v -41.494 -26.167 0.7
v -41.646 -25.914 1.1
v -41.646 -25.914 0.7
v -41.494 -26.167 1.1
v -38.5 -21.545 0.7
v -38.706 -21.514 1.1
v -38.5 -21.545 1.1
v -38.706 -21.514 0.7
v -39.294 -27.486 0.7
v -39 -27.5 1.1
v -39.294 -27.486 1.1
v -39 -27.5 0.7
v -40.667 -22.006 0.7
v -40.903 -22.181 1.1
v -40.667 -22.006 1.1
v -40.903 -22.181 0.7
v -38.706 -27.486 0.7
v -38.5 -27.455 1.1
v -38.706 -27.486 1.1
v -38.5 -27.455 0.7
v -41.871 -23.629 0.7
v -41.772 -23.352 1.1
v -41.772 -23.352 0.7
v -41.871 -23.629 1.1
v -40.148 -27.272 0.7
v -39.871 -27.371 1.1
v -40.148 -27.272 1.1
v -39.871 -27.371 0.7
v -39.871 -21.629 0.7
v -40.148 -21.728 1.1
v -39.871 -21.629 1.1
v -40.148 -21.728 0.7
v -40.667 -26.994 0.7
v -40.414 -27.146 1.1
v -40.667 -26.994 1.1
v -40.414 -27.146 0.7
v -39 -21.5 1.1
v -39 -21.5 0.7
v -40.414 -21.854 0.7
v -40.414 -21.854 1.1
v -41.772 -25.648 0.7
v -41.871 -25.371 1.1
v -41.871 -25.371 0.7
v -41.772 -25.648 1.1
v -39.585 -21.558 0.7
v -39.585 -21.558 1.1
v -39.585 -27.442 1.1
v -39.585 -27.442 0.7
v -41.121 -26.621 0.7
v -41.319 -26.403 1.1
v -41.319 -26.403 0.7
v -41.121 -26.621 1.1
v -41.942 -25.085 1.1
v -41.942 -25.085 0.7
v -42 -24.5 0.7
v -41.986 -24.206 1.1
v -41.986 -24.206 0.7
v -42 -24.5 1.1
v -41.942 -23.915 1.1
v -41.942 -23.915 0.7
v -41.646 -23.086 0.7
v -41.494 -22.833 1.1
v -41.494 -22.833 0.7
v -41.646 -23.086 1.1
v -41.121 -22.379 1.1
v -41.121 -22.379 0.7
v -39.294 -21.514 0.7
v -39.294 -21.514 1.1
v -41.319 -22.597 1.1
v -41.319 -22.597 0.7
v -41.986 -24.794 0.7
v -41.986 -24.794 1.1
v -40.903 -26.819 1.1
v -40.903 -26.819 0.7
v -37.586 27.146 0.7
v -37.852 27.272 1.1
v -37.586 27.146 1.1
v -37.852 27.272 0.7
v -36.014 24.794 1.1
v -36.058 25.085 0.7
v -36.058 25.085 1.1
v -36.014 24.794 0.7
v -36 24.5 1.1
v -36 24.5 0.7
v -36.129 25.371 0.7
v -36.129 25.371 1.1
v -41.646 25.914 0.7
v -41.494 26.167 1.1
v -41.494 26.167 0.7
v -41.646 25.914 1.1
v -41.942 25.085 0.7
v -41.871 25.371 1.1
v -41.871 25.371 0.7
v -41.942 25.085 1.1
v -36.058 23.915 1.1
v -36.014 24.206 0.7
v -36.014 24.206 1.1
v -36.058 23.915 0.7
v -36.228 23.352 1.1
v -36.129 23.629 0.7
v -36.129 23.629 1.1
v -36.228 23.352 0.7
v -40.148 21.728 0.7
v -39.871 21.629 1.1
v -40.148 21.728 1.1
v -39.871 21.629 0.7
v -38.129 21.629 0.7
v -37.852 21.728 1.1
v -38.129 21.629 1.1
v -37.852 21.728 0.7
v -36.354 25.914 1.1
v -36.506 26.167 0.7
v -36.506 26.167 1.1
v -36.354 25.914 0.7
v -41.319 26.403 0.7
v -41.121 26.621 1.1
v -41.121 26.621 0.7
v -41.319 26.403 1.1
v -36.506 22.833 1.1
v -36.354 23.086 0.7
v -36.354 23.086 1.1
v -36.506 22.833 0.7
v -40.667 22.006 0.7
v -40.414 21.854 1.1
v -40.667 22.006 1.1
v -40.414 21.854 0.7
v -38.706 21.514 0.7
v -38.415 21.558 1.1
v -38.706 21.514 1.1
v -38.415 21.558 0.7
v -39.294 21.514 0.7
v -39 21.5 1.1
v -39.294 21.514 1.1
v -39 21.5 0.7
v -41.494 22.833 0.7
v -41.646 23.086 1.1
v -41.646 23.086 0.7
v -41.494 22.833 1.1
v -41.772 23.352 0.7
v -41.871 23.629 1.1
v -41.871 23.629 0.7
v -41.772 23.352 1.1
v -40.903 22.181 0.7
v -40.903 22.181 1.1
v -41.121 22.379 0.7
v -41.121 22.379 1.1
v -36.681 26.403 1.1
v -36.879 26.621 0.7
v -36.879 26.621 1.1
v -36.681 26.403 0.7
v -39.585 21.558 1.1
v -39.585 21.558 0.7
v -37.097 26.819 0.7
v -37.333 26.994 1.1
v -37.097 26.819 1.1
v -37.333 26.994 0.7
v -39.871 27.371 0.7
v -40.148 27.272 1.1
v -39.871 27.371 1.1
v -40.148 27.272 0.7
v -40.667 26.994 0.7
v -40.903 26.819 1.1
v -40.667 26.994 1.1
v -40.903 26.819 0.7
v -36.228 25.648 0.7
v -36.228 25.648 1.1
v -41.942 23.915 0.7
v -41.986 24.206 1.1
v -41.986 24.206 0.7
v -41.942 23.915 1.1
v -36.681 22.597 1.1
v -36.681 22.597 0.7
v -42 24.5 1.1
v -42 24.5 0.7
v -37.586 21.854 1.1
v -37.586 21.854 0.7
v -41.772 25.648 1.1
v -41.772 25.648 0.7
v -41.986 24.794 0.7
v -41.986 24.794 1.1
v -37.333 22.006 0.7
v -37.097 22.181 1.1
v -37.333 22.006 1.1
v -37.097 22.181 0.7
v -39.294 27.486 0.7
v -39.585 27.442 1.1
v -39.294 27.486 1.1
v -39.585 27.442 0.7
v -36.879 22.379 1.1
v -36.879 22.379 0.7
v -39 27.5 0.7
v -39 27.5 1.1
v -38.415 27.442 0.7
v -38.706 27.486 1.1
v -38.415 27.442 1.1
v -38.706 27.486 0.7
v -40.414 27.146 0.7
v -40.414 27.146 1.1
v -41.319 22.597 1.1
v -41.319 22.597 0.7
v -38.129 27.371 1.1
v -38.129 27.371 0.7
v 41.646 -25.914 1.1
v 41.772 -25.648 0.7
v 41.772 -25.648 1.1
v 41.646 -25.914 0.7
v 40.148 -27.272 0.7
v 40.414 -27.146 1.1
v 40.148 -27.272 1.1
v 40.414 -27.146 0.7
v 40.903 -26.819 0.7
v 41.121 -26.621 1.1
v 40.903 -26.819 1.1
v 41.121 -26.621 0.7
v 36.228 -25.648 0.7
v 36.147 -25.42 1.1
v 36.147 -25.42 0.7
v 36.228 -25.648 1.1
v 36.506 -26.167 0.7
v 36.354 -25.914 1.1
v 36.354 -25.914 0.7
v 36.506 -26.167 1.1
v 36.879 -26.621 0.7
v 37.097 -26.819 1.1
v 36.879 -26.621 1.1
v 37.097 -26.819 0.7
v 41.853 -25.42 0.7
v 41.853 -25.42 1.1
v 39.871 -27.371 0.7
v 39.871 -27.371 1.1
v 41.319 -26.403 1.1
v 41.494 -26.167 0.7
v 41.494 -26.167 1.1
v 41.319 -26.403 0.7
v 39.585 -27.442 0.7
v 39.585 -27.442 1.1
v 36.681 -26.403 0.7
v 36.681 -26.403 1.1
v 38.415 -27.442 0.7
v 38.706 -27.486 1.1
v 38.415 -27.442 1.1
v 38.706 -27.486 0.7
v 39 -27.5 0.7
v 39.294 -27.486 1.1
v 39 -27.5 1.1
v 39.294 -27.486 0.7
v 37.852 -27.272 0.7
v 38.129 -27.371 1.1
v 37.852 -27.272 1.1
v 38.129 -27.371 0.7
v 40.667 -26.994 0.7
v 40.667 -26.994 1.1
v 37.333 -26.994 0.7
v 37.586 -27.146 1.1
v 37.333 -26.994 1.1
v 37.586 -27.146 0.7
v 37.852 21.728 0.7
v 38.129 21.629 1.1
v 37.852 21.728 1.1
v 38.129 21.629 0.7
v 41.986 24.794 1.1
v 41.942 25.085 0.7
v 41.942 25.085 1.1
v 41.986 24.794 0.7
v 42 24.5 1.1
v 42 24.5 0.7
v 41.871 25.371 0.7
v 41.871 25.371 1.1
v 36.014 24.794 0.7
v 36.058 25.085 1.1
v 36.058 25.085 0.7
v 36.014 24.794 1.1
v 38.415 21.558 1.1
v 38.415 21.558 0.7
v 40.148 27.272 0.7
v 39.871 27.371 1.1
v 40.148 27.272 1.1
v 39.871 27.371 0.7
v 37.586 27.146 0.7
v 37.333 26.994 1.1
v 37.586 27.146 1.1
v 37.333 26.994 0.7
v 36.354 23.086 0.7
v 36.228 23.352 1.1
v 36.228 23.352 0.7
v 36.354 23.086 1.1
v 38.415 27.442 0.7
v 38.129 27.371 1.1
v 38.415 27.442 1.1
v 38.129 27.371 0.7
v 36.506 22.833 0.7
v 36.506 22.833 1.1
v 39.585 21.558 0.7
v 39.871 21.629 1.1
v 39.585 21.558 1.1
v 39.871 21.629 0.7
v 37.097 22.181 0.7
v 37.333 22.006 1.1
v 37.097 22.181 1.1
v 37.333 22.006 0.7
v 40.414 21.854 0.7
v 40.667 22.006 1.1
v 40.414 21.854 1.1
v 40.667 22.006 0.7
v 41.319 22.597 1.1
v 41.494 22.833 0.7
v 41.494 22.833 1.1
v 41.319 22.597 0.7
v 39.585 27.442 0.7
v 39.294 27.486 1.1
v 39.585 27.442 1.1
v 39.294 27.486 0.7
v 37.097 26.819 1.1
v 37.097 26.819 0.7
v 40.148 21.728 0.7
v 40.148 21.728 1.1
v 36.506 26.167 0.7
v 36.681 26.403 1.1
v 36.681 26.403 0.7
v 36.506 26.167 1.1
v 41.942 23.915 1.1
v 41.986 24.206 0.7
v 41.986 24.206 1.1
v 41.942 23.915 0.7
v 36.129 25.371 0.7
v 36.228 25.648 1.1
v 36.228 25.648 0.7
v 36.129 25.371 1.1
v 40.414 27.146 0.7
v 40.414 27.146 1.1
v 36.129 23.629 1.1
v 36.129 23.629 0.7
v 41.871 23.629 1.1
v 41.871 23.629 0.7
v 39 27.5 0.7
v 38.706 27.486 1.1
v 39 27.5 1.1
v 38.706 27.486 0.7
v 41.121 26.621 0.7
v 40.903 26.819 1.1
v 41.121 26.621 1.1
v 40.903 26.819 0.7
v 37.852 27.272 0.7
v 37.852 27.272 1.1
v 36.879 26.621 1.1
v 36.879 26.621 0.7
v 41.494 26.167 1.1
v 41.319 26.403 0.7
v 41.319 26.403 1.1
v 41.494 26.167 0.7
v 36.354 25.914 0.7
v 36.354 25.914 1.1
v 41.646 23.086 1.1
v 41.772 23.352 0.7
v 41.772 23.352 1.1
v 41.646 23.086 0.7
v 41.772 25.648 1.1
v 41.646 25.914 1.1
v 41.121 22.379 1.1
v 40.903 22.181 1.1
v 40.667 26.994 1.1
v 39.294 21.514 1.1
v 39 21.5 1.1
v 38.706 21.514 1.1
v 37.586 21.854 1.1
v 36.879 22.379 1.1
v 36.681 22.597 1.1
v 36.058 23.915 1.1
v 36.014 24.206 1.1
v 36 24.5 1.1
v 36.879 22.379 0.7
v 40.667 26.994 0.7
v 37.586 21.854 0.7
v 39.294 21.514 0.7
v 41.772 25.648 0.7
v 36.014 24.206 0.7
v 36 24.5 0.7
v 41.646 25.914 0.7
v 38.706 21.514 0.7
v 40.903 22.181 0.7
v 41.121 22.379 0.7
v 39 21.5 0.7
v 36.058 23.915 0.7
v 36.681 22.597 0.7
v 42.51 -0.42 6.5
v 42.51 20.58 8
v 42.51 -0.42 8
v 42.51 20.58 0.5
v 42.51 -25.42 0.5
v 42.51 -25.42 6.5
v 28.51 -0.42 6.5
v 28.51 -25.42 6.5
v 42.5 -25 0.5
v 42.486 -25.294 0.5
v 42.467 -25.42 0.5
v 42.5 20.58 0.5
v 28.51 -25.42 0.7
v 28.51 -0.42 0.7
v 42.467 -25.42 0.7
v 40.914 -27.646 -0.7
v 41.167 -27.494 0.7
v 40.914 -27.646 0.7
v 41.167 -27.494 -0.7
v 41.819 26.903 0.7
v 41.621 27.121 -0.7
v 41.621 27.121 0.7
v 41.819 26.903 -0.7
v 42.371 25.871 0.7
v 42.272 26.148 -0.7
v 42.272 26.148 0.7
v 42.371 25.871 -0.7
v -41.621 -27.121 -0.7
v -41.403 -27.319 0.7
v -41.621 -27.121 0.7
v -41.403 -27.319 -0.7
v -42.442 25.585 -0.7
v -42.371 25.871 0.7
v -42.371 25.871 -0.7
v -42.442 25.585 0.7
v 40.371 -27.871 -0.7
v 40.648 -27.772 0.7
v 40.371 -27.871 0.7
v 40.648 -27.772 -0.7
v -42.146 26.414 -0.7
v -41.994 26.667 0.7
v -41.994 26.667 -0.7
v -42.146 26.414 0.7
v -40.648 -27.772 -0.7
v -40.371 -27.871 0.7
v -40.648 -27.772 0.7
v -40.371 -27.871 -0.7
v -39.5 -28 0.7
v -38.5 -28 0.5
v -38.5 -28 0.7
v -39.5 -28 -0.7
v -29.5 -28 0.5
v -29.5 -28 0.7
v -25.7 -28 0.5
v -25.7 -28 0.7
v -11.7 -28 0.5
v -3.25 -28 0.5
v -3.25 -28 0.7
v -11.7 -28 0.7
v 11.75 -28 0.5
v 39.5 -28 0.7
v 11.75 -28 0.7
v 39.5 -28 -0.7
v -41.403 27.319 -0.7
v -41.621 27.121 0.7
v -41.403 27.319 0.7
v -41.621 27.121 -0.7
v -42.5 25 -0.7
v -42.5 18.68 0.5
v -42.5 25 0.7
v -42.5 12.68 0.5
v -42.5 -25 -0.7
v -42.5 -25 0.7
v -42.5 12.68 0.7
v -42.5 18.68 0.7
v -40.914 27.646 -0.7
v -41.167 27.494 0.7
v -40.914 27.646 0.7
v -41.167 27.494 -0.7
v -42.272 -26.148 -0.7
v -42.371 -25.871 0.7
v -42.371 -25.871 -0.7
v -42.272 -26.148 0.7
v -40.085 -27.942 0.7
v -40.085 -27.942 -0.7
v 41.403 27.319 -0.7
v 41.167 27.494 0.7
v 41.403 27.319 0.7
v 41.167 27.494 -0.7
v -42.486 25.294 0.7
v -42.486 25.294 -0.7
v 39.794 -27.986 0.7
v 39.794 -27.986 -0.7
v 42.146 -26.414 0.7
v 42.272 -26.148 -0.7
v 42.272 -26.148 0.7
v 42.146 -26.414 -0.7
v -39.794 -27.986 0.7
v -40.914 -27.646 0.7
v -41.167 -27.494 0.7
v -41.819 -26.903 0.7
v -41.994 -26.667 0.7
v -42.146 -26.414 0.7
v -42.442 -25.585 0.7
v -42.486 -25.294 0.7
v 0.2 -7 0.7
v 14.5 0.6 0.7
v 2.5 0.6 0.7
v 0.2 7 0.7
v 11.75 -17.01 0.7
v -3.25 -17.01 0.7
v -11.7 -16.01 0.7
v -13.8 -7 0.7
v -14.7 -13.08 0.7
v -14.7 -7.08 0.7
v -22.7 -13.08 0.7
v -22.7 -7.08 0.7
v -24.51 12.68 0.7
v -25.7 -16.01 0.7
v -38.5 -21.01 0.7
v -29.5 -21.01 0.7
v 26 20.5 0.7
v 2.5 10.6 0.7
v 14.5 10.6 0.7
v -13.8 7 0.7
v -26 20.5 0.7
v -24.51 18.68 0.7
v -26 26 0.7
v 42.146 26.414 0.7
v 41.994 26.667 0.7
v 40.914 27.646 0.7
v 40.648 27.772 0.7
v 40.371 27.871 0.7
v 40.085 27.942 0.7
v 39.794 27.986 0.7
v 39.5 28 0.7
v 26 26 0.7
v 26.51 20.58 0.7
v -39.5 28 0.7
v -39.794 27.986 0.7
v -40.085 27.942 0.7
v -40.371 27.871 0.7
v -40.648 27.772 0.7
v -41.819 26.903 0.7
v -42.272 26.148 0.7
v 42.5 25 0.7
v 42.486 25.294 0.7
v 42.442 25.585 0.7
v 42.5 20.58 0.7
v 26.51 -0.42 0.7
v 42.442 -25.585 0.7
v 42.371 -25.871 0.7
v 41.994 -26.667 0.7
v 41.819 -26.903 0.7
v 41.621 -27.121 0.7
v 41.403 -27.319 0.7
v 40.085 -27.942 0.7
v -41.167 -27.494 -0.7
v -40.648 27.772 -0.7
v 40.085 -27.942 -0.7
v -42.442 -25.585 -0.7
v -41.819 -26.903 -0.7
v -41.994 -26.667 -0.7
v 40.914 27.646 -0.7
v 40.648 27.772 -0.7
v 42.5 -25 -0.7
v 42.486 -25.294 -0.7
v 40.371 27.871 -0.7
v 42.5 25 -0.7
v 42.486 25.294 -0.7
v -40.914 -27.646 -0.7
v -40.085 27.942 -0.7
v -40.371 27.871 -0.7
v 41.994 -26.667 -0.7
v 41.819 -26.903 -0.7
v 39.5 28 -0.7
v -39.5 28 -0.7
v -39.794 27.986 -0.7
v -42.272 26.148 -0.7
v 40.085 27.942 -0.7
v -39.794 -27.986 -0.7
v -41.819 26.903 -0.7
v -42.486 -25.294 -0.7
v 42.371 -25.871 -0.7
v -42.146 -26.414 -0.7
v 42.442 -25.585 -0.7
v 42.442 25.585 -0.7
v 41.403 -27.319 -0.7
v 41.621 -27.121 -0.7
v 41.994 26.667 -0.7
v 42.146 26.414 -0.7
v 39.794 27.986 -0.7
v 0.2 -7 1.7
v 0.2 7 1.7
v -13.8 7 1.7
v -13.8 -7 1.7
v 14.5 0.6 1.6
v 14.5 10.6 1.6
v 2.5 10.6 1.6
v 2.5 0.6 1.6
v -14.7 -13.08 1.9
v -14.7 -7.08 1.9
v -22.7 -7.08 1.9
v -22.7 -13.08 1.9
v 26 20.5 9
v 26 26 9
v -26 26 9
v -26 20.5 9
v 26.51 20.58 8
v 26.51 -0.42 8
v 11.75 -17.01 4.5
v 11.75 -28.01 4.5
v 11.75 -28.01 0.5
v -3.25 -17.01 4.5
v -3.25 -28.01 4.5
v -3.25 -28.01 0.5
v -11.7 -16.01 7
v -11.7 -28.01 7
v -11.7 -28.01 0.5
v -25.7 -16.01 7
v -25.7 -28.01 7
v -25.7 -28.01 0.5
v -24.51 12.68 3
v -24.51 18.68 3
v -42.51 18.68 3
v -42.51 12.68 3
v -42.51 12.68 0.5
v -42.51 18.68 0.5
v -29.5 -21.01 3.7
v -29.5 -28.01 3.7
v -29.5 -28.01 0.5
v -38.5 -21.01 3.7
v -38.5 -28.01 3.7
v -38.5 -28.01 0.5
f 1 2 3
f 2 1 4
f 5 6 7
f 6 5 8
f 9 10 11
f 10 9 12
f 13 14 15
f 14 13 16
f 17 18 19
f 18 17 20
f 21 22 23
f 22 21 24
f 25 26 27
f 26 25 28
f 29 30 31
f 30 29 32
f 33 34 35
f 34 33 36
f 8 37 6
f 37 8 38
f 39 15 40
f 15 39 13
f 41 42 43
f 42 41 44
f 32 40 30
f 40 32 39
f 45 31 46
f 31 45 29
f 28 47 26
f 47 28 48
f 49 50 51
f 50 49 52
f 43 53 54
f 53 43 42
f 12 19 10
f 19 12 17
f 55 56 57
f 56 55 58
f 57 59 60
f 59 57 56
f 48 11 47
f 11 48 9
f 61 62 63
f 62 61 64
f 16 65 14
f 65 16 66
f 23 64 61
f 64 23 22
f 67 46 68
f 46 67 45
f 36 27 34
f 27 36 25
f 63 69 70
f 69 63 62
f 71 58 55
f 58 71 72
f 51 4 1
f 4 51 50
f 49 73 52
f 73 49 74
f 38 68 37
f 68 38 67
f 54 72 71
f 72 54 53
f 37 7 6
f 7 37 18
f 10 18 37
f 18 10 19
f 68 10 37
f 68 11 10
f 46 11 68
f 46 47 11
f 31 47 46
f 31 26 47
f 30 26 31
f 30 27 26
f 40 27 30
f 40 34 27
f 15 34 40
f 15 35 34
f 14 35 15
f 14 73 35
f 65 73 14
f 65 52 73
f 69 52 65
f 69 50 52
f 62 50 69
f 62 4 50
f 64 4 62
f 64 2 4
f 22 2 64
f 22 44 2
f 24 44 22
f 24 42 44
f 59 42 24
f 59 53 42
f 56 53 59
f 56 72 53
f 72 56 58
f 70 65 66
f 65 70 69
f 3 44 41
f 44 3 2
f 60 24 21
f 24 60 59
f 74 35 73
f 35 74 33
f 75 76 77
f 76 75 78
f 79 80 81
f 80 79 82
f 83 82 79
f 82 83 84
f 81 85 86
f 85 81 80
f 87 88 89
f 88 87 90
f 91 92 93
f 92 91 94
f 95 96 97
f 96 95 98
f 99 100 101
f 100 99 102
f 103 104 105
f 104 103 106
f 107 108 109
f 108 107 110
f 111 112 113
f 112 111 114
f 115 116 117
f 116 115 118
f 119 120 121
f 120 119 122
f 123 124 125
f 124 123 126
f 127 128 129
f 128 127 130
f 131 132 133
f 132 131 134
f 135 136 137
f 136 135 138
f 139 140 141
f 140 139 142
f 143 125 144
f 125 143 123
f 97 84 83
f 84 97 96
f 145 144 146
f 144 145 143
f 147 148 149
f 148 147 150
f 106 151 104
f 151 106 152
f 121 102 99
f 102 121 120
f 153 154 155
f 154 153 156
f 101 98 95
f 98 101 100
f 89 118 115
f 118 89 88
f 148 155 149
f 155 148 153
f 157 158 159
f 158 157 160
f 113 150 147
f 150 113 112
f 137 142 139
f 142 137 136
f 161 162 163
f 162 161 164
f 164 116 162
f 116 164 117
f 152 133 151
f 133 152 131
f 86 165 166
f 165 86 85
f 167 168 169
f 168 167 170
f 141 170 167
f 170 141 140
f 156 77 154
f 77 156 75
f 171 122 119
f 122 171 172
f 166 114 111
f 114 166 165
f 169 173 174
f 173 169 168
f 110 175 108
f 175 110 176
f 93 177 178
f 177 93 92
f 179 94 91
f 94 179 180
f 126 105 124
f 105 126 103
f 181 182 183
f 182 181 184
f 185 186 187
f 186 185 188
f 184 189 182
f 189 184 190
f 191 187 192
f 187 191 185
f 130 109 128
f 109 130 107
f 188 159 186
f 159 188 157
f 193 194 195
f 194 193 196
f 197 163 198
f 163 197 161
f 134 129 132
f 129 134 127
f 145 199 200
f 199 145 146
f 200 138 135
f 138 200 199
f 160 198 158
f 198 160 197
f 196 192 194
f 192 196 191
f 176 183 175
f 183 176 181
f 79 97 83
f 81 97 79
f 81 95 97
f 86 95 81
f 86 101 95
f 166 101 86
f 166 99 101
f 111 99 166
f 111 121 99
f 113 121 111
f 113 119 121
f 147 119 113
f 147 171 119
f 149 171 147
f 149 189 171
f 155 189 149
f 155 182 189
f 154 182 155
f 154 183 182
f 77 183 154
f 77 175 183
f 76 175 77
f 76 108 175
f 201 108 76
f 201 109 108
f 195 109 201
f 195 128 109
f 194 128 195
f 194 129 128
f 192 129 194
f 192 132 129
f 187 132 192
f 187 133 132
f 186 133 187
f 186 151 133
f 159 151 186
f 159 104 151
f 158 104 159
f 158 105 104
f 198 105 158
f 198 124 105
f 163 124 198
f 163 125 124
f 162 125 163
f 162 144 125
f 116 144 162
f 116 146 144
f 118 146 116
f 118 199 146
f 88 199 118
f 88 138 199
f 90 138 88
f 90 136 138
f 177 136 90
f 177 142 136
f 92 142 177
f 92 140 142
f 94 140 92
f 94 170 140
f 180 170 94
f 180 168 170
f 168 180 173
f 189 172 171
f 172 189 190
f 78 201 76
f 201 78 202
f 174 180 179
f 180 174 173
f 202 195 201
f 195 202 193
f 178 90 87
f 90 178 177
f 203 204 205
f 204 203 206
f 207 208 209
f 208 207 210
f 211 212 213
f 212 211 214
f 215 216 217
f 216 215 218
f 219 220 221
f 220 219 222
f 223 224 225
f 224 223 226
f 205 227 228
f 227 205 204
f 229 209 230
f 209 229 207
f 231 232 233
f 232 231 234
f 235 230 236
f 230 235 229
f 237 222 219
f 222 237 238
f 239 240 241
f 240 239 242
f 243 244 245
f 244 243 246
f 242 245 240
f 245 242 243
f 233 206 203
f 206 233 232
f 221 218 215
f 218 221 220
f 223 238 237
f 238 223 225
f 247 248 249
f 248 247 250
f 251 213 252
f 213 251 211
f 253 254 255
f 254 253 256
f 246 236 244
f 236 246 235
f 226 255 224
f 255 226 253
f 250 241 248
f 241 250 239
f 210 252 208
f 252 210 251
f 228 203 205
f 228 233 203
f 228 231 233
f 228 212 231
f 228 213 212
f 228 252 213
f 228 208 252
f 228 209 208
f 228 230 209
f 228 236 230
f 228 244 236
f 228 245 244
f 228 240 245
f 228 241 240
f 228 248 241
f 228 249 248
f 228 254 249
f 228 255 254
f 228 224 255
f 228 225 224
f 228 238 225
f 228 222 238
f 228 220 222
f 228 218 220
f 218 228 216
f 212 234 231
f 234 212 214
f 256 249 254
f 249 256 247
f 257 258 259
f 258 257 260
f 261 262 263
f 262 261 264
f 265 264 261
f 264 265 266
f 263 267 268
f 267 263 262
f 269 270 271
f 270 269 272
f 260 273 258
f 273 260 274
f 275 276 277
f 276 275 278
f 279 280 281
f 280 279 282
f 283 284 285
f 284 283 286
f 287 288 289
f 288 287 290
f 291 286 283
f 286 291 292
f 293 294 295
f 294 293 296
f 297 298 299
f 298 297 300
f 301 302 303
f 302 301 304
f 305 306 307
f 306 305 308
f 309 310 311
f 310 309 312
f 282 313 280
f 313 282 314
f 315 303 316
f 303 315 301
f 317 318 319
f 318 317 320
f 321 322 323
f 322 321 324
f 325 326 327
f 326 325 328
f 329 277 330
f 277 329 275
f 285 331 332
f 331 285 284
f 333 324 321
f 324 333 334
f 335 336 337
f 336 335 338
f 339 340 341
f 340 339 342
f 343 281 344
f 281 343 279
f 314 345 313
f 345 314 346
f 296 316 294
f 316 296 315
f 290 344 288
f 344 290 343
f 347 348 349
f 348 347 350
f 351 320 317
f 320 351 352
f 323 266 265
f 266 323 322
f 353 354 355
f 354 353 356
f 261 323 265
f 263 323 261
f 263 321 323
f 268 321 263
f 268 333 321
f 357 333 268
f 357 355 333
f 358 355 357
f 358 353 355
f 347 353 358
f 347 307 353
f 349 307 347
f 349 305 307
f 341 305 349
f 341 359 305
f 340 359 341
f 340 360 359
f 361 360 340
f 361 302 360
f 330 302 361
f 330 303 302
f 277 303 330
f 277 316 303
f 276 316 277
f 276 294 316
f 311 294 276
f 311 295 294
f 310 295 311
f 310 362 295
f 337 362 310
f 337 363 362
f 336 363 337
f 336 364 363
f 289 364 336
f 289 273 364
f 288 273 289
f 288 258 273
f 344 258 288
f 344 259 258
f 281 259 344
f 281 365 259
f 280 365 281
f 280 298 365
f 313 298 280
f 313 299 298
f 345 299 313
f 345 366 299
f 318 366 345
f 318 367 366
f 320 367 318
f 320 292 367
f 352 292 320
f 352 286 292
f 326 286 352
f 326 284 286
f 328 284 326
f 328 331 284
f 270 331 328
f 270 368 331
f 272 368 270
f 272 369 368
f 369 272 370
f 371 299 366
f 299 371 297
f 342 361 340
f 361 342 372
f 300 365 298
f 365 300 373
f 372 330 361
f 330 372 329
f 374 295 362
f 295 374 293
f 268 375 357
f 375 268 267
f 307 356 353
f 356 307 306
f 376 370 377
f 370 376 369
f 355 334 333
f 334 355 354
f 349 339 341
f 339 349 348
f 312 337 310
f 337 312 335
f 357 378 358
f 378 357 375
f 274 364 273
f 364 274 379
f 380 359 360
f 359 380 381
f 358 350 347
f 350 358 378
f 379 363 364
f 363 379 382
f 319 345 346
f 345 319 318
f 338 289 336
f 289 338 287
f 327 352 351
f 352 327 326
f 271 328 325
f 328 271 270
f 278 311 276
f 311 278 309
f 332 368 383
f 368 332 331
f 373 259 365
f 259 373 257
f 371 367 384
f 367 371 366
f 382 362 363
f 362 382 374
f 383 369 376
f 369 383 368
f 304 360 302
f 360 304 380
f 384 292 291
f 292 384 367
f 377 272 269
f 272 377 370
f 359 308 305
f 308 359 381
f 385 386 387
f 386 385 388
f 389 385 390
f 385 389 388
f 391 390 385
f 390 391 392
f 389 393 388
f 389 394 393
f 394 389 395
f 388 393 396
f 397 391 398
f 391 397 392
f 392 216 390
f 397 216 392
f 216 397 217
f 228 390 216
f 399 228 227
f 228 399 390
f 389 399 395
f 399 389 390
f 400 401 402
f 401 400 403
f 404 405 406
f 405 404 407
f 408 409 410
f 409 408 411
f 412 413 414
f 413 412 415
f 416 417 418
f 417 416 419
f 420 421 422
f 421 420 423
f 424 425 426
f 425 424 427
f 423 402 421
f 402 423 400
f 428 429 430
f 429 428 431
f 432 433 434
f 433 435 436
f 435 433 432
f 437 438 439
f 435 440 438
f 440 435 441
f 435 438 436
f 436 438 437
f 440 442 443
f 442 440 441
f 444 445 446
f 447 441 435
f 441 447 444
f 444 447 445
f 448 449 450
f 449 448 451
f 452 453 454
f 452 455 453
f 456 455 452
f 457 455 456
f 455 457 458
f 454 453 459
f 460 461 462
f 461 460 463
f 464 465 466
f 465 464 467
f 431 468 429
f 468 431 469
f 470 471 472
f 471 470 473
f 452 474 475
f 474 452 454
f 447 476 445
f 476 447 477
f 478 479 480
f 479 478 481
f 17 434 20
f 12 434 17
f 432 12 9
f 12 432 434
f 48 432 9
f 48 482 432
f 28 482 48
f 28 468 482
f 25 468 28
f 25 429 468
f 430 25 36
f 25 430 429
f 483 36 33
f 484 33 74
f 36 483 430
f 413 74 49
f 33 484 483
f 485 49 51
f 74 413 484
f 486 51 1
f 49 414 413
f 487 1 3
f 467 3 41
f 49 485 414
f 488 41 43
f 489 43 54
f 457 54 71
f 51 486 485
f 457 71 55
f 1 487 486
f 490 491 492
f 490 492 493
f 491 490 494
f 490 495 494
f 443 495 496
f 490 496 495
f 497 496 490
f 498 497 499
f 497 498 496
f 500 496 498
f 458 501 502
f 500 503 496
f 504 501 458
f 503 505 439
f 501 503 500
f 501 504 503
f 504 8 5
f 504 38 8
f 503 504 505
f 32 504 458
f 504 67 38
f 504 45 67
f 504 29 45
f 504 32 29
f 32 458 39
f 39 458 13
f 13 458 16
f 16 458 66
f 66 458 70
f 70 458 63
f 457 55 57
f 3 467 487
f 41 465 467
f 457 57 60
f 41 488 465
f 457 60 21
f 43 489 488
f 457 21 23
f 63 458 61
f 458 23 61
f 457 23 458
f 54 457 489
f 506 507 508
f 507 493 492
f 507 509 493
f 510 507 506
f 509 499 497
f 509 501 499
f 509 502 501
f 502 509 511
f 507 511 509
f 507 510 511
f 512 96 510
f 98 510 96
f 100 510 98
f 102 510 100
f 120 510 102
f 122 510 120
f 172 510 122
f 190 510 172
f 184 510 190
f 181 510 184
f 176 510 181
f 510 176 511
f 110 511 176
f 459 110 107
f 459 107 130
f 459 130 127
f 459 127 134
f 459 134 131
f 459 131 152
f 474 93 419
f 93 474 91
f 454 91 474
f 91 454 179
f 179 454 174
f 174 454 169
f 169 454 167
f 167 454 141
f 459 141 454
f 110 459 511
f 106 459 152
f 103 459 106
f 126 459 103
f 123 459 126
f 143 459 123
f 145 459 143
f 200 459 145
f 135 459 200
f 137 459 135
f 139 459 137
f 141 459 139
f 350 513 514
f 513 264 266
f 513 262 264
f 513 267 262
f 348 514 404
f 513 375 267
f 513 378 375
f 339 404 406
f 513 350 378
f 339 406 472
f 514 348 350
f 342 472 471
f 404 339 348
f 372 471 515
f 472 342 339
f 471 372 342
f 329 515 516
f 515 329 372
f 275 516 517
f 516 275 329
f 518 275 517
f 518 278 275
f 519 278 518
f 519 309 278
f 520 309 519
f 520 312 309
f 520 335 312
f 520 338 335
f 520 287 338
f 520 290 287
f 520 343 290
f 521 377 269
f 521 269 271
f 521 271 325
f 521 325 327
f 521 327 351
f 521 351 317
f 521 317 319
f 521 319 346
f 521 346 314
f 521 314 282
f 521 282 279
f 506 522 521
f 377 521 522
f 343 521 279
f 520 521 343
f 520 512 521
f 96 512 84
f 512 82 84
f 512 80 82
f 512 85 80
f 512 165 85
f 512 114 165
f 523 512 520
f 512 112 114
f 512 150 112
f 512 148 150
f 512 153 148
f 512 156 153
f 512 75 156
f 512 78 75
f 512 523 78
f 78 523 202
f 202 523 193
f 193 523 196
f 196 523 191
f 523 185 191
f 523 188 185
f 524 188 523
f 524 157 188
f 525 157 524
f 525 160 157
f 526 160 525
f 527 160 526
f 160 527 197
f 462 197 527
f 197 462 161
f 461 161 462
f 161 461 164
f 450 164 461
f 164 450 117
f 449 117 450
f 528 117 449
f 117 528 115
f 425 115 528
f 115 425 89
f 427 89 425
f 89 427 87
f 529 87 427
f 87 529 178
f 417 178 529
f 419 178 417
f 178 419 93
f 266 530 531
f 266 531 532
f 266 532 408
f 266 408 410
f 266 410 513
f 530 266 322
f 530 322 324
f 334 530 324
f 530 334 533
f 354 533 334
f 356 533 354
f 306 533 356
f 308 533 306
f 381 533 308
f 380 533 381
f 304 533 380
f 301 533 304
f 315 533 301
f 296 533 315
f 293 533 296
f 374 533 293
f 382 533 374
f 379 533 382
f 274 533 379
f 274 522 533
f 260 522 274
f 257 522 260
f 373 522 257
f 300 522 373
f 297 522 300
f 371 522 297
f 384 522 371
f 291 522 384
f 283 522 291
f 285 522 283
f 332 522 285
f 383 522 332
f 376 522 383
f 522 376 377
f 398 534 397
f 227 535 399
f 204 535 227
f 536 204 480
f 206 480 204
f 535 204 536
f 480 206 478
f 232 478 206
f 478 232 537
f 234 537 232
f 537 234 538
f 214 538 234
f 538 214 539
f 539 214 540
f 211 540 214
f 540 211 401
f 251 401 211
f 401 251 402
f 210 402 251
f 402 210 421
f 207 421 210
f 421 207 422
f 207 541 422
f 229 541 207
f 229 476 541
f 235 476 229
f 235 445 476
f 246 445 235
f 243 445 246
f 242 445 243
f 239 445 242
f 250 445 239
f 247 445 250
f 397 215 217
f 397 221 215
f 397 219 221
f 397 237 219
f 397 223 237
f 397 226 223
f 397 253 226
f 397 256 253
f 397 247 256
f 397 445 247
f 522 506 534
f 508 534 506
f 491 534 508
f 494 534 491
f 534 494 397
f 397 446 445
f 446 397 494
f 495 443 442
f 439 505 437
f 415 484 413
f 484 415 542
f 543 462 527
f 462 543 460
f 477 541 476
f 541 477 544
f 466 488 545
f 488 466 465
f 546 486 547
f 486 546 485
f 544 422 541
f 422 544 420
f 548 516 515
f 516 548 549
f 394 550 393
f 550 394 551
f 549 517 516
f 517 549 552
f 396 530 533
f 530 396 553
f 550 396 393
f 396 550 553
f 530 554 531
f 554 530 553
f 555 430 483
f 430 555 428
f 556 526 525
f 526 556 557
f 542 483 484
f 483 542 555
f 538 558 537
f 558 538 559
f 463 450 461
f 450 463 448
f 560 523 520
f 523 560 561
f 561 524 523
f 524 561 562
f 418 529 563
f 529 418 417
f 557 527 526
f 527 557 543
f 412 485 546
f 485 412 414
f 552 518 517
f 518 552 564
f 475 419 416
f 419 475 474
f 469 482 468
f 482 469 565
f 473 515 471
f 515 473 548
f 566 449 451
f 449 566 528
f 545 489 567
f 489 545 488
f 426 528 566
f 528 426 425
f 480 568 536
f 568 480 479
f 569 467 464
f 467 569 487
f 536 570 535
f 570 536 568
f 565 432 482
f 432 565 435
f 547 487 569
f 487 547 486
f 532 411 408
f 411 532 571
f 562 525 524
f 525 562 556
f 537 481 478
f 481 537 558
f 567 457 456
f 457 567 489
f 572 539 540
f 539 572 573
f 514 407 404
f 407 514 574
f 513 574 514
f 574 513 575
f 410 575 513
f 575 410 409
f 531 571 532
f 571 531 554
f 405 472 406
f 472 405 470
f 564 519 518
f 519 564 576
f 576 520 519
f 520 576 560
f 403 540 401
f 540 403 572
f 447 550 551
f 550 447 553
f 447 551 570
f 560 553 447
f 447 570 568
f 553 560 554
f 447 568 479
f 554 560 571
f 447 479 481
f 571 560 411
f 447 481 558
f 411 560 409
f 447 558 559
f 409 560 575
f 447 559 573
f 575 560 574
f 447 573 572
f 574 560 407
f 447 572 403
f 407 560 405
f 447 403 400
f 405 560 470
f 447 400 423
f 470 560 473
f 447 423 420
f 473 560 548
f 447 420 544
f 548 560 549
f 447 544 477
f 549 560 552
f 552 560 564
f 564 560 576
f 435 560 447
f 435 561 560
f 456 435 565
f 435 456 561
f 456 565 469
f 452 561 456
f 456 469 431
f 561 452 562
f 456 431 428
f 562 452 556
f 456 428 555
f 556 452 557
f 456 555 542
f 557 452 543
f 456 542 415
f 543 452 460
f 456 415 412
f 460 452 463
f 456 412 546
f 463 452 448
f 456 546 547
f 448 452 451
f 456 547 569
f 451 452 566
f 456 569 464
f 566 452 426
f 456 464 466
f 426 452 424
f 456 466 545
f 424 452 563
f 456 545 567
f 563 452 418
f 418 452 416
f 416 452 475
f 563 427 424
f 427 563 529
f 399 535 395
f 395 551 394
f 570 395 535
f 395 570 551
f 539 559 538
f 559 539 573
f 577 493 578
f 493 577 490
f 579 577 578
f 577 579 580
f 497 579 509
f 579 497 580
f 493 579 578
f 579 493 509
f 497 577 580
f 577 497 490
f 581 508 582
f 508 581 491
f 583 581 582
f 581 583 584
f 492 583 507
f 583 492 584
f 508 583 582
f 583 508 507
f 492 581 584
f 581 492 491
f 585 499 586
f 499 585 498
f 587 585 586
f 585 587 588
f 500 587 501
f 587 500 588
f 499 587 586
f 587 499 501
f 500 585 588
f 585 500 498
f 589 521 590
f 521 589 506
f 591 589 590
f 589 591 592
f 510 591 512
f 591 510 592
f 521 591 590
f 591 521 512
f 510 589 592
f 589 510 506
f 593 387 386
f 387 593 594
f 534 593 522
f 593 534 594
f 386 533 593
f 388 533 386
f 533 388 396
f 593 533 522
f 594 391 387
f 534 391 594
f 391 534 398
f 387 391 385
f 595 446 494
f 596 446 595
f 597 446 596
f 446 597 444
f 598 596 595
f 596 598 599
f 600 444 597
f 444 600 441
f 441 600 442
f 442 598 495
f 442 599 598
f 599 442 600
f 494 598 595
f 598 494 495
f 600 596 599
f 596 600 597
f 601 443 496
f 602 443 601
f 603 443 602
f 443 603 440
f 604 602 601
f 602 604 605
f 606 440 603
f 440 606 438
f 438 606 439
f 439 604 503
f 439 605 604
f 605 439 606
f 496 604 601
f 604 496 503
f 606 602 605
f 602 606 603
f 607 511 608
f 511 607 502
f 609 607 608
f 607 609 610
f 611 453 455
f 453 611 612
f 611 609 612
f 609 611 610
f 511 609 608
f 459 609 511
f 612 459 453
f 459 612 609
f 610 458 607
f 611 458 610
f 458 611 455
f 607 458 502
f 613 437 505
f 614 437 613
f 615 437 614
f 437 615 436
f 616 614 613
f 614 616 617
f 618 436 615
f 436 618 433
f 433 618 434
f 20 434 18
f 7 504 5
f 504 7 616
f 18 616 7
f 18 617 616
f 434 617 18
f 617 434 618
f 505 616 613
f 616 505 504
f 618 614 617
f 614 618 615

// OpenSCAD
$fn = 64;

// Target PCB dimensions (mm)
pcb_length = 85.0;
pcb_width  = 56.0;
pcb_thickness = 1.4;

// Detail parameters (kept small and connected)
corner_r = 3.0;          // rounded corner radius
overlap = 0.2;           // small overlap to guarantee connectivity
mask = 0.01;             // tiny offset to avoid coplanar artifacts

// Component heights (above PCB)
chip_h = 1.2;
usb_h  = 6.0;
eth_h  = 7.5;
hdmi_h = 4.0;
jack_h = 6.5;
gpio_h = 8.5;

// Helper: rounded rectangle prism centered at origin
module rounded_rect_prism(L, W, H, R) {
    // Ensure R is valid
    r = min(R, min(L, W)/2 - 0.01);
    linear_extrude(height=H, center=true)
        offset(r=r)
            square([L - 2*r, W - 2*r], center=true);
}

// Helper: place a part so it sits on top of PCB (and overlaps slightly into it)
module on_top(part_h) {
    translate([0, 0, pcb_thickness/2 + part_h/2 - overlap])
        children();
}

// Main model: one connected solid (union of PCB + components)
module single_board_computer() {
    union() {
        // PCB body
        color([0.0, 0.4, 0.2])
            rounded_rect_prism(pcb_length, pcb_width, pcb_thickness, corner_r);

        // Mounting hole pads (solid bosses; no holes to keep one solid)
        pad_d = 6.0;
        pad_h = 0.6;
        hole_inset_x = 3.5;
        hole_inset_y = 3.5;

        for (sx = [-1, 1], sy = [-1, 1]) {
            translate([
                sx*(pcb_length/2 - hole_inset_x),
                sy*(pcb_width/2  - hole_inset_y),
                pcb_thickness/2 + pad_h/2 - overlap
            ])
            color([0.85, 0.75, 0.2])
                cylinder(d=pad_d, h=pad_h, center=true);
        }

        // Main SoC chip (center-ish)
        chip1_l = 14; chip1_w = 14;
        translate([ -pcb_length*0.08, 0, 0 ])
            on_top(chip_h)
                color([0.15, 0.15, 0.15])
                    cube([chip1_l, chip1_w, chip_h], center=true);

        // RAM chip
        chip2_l = 12; chip2_w = 10; chip2_h = 1.1;
        translate([ pcb_length*0.10, pcb_width*0.10, 0 ])
            on_top(chip2_h)
                color([0.18, 0.18, 0.18])
                    cube([chip2_l, chip2_w, chip2_h], center=true);

        // Small power/regulator block
        reg_l = 8; reg_w = 6; reg_h = 1.4;
        translate([ -pcb_length*0.22, -pcb_width*0.18, 0 ])
            on_top(reg_h)
                color([0.12, 0.12, 0.12])
                    cube([reg_l, reg_w, reg_h], center=true);

        // GPIO header (pin block) along top edge (y+)
        gpio_l = 52; gpio_w = 5.5;
        translate([ 0, pcb_width/2 - gpio_w/2 - 2.0, 0 ])
            on_top(gpio_h)
                color([0.05, 0.05, 0.05])
                    cube([gpio_l, gpio_w, gpio_h], center=true);

        // Side connectors along right edge (x+): USB + Ethernet blocks
        // Ethernet (larger)
        eth_l = 16; eth_w = 21;
        translate([ pcb_length/2 - eth_l/2 + mask, pcb_width*0.18, 0 ])
            on_top(eth_h)
                color([0.75, 0.75, 0.75])
                    cube([eth_l, eth_w, eth_h], center=true);

        // Two USB ports (stacked-ish)
        usb_l = 14; usb_w = 15;
        for (yy = [ -pcb_width*0.10, -pcb_width*0.32 ]) {
            translate([ pcb_length/2 - usb_l/2 + mask, yy, 0 ])
                on_top(usb_h)
                    color([0.78, 0.78, 0.78])
                        cube([usb_l, usb_w, usb_h], center=true);
        }

        // Bottom edge connectors (y-): HDMI + audio jack
        // HDMI
        hdmi_l = 15; hdmi_w = 11;
        translate([ pcb_length*0.05, -pcb_width/2 + hdmi_w/2 - mask, 0 ])
            on_top(hdmi_h)
                color([0.65, 0.65, 0.65])
                    cube([hdmi_l, hdmi_w, hdmi_h], center=true);

        // Audio jack
        jack_l = 14; jack_w = 12;
        translate([ -pcb_length*0.22, -pcb_width/2 + jack_w/2 - mask, 0 ])
            on_top(jack_h)
                color([0.10, 0.10, 0.10])
                    cube([jack_l, jack_w, jack_h], center=true);

        // Camera/Display connector (small) near left edge (x-)
        ffc_l = 18; ffc_w = 6; ffc_h = 2.5;
        translate([ -pcb_length/2 + ffc_l/2 - mask, pcb_width*0.28, 0 ])
            on_top(ffc_h)
                color([0.85, 0.85, 0.85])
                    cube([ffc_l, ffc_w, ffc_h], center=true);

        // Micro-USB / USB-C power connector near bottom-left edge
        pwr_l = 9; pwr_w = 7; pwr_h = 3.2;
        translate([ -pcb_length*0.40, -pcb_width/2 + pwr_w/2 - mask, 0 ])
            on_top(pwr_h)
                color([0.70, 0.70, 0.70])
                    cube([pwr_l, pwr_w, pwr_h], center=true);
    }
}

single_board_computer();
